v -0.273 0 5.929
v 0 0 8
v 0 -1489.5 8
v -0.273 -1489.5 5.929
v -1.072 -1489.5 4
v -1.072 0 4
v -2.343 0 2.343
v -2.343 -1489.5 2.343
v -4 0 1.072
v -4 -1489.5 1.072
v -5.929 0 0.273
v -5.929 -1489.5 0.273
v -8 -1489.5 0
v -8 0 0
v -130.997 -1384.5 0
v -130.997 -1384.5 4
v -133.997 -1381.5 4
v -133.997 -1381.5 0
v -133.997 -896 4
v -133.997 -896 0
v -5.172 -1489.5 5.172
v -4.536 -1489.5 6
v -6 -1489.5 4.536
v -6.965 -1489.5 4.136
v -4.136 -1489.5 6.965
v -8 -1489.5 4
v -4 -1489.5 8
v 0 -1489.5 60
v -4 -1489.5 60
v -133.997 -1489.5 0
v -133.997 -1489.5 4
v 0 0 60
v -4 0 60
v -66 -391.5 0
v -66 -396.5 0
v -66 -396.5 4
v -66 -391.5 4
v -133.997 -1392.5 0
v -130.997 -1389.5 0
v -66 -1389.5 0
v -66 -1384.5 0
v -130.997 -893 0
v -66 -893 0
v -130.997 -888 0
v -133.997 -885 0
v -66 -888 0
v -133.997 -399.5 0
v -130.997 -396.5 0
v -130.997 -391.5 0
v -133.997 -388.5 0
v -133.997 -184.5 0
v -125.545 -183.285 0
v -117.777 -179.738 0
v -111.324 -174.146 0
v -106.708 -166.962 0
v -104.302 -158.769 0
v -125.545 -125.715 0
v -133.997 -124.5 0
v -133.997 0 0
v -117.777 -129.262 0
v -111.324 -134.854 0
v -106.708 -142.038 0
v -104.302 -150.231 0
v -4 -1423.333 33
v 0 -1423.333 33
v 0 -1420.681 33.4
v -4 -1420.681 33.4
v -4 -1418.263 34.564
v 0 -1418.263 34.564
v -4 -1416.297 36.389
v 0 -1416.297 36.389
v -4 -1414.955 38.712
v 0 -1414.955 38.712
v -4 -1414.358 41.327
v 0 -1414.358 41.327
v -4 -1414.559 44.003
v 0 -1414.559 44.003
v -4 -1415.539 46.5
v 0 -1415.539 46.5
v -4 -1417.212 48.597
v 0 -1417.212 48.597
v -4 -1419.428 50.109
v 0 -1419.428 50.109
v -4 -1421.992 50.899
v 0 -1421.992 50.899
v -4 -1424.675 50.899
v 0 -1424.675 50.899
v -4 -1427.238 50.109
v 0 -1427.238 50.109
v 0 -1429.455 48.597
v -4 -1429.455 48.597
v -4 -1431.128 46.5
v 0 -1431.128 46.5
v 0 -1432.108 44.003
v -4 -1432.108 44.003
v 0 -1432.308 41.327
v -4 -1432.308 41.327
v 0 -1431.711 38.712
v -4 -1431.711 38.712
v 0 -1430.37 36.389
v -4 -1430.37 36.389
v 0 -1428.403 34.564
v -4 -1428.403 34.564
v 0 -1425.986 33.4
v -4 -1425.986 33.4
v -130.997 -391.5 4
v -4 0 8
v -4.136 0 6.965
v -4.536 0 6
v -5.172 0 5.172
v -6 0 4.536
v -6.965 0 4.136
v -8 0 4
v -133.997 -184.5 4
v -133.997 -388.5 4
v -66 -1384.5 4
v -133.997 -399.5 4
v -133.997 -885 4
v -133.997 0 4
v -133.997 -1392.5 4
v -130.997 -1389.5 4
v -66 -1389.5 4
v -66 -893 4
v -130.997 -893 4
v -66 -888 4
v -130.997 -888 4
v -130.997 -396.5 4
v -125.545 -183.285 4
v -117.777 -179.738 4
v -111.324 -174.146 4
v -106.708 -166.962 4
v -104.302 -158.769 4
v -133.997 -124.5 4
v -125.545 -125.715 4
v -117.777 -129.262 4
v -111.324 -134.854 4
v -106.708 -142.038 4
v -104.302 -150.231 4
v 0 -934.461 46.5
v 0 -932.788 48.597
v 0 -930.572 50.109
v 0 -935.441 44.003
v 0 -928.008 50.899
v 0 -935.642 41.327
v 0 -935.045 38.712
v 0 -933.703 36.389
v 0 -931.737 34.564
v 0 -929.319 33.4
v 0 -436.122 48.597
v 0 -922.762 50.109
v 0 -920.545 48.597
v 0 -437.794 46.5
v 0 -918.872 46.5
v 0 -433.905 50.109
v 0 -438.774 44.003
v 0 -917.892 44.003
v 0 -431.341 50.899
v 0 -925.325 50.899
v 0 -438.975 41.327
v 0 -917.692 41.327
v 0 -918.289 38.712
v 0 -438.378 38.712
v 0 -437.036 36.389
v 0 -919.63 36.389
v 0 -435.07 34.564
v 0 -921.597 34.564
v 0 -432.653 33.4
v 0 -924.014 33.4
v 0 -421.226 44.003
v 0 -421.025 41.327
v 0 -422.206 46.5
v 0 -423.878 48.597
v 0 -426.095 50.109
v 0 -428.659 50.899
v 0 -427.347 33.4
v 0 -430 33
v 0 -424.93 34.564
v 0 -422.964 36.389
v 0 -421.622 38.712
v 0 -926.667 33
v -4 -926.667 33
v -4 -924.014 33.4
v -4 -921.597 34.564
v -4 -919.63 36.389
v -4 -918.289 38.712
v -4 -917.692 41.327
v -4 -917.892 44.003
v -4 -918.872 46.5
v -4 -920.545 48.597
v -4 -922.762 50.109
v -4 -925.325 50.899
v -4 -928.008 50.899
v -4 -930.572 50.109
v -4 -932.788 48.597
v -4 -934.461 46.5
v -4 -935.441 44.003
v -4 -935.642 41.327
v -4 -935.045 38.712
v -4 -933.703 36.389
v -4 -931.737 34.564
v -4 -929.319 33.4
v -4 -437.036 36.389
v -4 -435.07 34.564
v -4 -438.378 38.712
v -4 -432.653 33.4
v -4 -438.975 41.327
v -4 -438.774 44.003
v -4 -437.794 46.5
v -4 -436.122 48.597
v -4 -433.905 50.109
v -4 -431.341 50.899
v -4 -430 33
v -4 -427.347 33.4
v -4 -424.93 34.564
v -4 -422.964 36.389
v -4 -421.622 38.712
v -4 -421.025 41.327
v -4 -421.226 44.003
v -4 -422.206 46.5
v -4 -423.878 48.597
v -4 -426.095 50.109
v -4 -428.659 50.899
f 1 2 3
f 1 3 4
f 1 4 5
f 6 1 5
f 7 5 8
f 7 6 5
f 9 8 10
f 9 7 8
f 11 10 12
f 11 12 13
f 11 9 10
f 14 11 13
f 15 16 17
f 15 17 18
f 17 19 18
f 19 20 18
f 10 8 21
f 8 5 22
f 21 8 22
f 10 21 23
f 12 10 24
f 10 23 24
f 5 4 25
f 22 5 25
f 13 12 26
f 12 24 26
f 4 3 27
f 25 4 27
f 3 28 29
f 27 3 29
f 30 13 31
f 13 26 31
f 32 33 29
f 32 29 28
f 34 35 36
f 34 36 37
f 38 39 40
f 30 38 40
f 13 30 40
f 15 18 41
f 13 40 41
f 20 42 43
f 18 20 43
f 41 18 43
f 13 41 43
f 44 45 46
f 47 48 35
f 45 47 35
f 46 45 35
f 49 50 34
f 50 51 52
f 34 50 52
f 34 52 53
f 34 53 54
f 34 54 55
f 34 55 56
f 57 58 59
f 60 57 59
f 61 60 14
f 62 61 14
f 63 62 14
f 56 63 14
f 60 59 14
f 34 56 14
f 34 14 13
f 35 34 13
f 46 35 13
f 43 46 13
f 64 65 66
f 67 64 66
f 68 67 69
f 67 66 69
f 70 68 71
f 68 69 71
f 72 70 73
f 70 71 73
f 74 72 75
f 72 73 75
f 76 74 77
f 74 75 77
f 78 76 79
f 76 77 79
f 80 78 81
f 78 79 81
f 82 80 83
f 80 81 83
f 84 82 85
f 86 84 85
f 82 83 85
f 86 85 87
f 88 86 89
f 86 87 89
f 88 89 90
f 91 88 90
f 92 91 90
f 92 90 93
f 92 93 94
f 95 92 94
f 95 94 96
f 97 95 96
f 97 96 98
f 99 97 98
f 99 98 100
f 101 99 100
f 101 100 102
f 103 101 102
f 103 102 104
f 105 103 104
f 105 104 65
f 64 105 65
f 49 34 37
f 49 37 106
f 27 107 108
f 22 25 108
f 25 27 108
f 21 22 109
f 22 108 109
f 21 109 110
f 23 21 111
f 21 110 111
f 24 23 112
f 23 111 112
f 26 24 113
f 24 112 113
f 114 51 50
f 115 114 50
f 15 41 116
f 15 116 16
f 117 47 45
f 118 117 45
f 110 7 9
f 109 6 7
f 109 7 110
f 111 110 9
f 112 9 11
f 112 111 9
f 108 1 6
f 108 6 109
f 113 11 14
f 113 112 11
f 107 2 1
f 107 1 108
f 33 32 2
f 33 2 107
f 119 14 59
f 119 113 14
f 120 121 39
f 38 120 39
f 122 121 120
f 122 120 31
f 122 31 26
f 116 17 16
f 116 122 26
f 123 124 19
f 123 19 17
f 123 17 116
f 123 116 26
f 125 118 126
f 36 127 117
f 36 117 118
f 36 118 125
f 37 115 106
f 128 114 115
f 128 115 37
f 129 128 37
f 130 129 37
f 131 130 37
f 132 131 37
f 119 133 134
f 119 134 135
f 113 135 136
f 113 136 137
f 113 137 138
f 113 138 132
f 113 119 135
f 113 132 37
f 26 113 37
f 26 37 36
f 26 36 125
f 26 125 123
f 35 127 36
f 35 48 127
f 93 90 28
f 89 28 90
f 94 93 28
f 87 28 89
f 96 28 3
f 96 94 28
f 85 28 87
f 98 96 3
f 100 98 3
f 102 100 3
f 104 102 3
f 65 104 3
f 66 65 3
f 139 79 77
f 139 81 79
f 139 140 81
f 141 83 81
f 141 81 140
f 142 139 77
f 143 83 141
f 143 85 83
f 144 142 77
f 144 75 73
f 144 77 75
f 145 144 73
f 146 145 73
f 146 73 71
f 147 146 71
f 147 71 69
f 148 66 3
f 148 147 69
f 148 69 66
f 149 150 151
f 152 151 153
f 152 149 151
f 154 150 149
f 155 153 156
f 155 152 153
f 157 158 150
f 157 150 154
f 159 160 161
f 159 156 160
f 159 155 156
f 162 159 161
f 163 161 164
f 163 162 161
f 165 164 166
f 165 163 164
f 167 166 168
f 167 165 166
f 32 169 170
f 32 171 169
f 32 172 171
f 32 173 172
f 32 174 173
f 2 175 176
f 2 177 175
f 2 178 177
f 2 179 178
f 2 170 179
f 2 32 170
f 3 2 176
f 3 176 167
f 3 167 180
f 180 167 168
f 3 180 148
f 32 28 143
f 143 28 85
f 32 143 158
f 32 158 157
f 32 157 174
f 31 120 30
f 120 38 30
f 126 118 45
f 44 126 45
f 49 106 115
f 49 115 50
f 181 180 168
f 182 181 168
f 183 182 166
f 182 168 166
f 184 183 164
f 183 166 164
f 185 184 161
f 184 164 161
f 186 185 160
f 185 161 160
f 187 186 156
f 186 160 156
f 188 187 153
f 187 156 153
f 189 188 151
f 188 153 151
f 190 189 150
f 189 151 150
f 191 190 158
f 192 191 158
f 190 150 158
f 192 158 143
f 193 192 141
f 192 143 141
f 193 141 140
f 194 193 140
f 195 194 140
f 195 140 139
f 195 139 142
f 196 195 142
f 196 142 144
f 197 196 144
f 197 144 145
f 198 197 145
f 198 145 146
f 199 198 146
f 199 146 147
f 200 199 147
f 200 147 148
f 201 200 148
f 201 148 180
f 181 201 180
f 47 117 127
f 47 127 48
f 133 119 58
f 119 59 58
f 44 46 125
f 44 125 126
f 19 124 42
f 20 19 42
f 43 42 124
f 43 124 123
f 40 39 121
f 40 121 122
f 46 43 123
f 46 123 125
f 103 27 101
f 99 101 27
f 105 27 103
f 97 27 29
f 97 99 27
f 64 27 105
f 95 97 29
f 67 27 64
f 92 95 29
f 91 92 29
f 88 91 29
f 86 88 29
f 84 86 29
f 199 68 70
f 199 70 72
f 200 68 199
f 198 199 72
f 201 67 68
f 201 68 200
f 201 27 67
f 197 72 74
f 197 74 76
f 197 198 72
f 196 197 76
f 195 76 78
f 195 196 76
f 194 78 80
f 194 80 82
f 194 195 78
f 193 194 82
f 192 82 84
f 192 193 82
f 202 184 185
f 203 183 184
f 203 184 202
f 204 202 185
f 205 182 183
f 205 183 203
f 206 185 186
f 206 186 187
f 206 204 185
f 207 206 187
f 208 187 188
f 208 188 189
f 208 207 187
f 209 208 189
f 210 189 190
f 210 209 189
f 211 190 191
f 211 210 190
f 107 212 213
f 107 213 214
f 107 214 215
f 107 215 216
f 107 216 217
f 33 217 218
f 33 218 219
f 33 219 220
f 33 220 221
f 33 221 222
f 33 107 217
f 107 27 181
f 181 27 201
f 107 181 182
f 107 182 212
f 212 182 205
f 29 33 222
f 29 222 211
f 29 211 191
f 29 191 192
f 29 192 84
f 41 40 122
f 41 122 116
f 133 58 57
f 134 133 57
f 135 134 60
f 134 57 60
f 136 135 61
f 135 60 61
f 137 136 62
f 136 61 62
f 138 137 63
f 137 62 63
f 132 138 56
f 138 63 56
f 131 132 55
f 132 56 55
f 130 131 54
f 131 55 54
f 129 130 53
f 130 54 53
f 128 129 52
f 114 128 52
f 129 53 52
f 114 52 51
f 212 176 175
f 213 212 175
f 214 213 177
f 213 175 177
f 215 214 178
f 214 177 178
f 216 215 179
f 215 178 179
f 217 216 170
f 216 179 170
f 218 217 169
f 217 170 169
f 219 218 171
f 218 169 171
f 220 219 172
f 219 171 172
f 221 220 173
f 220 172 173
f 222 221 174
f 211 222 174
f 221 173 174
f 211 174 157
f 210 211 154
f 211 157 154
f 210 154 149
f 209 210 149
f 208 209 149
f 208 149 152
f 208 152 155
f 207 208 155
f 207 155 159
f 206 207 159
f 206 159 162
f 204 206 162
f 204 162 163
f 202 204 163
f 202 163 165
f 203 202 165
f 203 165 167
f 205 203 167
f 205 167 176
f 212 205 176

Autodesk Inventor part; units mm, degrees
ref_plane "YZ Plane" through (0, 0, 0) normal (1, 0, 0) x (0, 1, 0)
ref_plane "XZ Plane" through (0, 0, 0) normal (0, 1, 0) x (-1, 0, 0)
ref_plane "XY Plane" through (0, 0, 0) normal (0, 0, 1) x (1, 0, 0)
sketch "Sketch1" plane through (0, 0, 0) normal (0, 0, 1) x (1, 0, 0)
  line L0 (0, 0) -> (-133.9966, 0)
  line L1 (-133.9966, 0) -> (-133.9966, -1489.5)
  line L2 (-133.9966, -1489.5) -> (0, -1489.5)
  line L3 (0, -1489.5) -> (0, 0)
  line L4 (-133.9966, -1389.5) -> (-66, -1389.5)
  line L5 (-66, -1389.5) -> (-66, -1384.5)
  line L6 (-66, -1384.5) -> (-133.9966, -1384.5)
  line L7 (-133.9966, -1384.5) -> (-133.9966, -1389.5)
  line L8 (-133.9966, -893) -> (-66, -893)
  line L9 (-66, -893) -> (-66, -888)
  line L10 (-66, -888) -> (-133.9966, -888)
  line L11 (-133.9966, -888) -> (-133.9966, -893)
  line L12 (-133.9966, -396.5) -> (-66, -396.5)
  line L13 (-66, -396.5) -> (-66, -391.5)
  line L14 (-66, -391.5) -> (-133.9966, -391.5)
  line L15 (-133.9966, -391.5) -> (-133.9966, -396.5)
  circle A0 centre (-133.9966, -154.5) radius 30
  point P0 (-133.9966, -391.5)
  point P1 (-133.9966, -124.5)
  point P2 (-133.9966, -184.5)
  dimension "d0" = 1489.5
  dimension "d1" = 133.9966
  dimension "d2" = 5
  dimension "d4" = 100
  dimension "d7" = 496.5
  dimension "d23" = 66
  dimension "d28" = 60
  dimension "d29" = 1335
extrude "Plate1" add sketch "Sketch1" along normal blind 4 contours L3 L2 L1 L4 L5 L6 L8 L9 L10 L12 L13 L14 A0 L0
sketch "Sketch2" plane through (-4, 0, 0) normal (1, 0, 0) x (0, 1, 0)
  line L0 (-1489.5, 0) -> (0, 0)
  line L1 (0, 0) -> (0, 60)
  line L2 (0, 60) -> (-1489.5, 60)
  line L3 (-1489.5, 60) -> (-1489.5, 0)
edge flange "Flange1" height 60 angle 90 thickness 4 bend radius 4 thickness toward (1, 0, 0) relief tear relief width 4 relief depth 2 edges at (0, -744.75, 4) wall of the first edge with corners at (-4, -1489.5, 0) (-4, 0, 0) (-4, 0, 60) (-4, -1489.5, 60)
bend "Bend1"
corner "Corner1"
chamfer "Corner Chamfer1" distance 3 angle 45 6 edges at (-133.9966, -1389.5, 2) (-133.9966, -1384.5, 2) (-133.9966, -893, 2) (-133.9966, -888, 2) (-133.9966, -391.5, 2) (-133.9966, -396.5, 2)
sketch "Sketch4" plane through (0, -1489.5, 60) normal (1, 0, 0) x (0, 0, -1)
  circle A0 centre (18, 1059.5) radius 9
  line L0 (0, 1489.5) -> (52, 1489.5) projected
  line L1 (0, 0) -> (0, 1489.5) projected
  circle A1 centre (18, 562.8333) radius 9
  circle A2 centre (18, 66.1667) radius 9
  point P0 (60, 1489.5)
  dimension "d30" = 430
  dimension "d31" = 18
  dimension "d32" = 18
  dimension "d35" = 496.6667
extrude "Cut1" cut sketch "Sketch4" against normal blind 4
equation "\"d0\" = Стрингер_длина"
equation "\"d1\" = стрингер_глубина_6"
equation "\"d2\" = паз_под_стрингер_толщина"
equation "\"d7\" = 0.333333 * Стрингер_длина"
equation "\"d23\" = паз_под_стрингер_глубина - Thickness"
equation "\"d28\" = 2 * радиус_выреза_под_сварку"
equation "\"d35\" = Шаг_шпангоутов"
equation "\"d40\" = Thickness"
equation "\"d12\" = Thickness"
equation "\"d13\" = BendReliefWidth"
equation "\"d14\" = BendReliefDepth"
equation "\"d15\" = MinimumRemnant"
equation "\"d16\" = TransitionRadius"
equation "\"d17\" = ребро_усилителей"
equation "\"d19\" = BendRadius"
equation "\"d20\" = CornerReliefSize"
equation "\"d21\" = GapSize"
equation "\"d22\" = JacobiRadiusSize"
equation "\"BendRadius\" = Thickness"
equation "\"BendReliefWidth\" = Thickness"
equation "\"BendReliefDepth\" = 0.5 * Thickness"
equation "\"CornerReliefSize\" = 4 * Thickness"
equation "\"MinimumRemnant\" = 2 * Thickness"
equation "\"TransitionRadius\" = BendRadius"
equation "\"JacobiRadiusSize\" = BendRadius"
equation "\"GapSize\" = Thickness"
equation "\"Стрингер_длина\" = 1489.5"
equation "\"стрингер_глубина_6\" = 133.996634"
equation "\"паз_под_стрингер_толщина\" = 5"
equation "\"паз_под_стрингер_глубина\" = 70"
equation "\"Thickness\" = 4"
equation "\"радиус_выреза_под_сварку\" = 30"
equation "\"Шаг_шпангоутов\" = 496.666667"
equation "\"ребро_усилителей\" = 60"
properties part number "GBK 0204 stringer 6" material "Steel"
